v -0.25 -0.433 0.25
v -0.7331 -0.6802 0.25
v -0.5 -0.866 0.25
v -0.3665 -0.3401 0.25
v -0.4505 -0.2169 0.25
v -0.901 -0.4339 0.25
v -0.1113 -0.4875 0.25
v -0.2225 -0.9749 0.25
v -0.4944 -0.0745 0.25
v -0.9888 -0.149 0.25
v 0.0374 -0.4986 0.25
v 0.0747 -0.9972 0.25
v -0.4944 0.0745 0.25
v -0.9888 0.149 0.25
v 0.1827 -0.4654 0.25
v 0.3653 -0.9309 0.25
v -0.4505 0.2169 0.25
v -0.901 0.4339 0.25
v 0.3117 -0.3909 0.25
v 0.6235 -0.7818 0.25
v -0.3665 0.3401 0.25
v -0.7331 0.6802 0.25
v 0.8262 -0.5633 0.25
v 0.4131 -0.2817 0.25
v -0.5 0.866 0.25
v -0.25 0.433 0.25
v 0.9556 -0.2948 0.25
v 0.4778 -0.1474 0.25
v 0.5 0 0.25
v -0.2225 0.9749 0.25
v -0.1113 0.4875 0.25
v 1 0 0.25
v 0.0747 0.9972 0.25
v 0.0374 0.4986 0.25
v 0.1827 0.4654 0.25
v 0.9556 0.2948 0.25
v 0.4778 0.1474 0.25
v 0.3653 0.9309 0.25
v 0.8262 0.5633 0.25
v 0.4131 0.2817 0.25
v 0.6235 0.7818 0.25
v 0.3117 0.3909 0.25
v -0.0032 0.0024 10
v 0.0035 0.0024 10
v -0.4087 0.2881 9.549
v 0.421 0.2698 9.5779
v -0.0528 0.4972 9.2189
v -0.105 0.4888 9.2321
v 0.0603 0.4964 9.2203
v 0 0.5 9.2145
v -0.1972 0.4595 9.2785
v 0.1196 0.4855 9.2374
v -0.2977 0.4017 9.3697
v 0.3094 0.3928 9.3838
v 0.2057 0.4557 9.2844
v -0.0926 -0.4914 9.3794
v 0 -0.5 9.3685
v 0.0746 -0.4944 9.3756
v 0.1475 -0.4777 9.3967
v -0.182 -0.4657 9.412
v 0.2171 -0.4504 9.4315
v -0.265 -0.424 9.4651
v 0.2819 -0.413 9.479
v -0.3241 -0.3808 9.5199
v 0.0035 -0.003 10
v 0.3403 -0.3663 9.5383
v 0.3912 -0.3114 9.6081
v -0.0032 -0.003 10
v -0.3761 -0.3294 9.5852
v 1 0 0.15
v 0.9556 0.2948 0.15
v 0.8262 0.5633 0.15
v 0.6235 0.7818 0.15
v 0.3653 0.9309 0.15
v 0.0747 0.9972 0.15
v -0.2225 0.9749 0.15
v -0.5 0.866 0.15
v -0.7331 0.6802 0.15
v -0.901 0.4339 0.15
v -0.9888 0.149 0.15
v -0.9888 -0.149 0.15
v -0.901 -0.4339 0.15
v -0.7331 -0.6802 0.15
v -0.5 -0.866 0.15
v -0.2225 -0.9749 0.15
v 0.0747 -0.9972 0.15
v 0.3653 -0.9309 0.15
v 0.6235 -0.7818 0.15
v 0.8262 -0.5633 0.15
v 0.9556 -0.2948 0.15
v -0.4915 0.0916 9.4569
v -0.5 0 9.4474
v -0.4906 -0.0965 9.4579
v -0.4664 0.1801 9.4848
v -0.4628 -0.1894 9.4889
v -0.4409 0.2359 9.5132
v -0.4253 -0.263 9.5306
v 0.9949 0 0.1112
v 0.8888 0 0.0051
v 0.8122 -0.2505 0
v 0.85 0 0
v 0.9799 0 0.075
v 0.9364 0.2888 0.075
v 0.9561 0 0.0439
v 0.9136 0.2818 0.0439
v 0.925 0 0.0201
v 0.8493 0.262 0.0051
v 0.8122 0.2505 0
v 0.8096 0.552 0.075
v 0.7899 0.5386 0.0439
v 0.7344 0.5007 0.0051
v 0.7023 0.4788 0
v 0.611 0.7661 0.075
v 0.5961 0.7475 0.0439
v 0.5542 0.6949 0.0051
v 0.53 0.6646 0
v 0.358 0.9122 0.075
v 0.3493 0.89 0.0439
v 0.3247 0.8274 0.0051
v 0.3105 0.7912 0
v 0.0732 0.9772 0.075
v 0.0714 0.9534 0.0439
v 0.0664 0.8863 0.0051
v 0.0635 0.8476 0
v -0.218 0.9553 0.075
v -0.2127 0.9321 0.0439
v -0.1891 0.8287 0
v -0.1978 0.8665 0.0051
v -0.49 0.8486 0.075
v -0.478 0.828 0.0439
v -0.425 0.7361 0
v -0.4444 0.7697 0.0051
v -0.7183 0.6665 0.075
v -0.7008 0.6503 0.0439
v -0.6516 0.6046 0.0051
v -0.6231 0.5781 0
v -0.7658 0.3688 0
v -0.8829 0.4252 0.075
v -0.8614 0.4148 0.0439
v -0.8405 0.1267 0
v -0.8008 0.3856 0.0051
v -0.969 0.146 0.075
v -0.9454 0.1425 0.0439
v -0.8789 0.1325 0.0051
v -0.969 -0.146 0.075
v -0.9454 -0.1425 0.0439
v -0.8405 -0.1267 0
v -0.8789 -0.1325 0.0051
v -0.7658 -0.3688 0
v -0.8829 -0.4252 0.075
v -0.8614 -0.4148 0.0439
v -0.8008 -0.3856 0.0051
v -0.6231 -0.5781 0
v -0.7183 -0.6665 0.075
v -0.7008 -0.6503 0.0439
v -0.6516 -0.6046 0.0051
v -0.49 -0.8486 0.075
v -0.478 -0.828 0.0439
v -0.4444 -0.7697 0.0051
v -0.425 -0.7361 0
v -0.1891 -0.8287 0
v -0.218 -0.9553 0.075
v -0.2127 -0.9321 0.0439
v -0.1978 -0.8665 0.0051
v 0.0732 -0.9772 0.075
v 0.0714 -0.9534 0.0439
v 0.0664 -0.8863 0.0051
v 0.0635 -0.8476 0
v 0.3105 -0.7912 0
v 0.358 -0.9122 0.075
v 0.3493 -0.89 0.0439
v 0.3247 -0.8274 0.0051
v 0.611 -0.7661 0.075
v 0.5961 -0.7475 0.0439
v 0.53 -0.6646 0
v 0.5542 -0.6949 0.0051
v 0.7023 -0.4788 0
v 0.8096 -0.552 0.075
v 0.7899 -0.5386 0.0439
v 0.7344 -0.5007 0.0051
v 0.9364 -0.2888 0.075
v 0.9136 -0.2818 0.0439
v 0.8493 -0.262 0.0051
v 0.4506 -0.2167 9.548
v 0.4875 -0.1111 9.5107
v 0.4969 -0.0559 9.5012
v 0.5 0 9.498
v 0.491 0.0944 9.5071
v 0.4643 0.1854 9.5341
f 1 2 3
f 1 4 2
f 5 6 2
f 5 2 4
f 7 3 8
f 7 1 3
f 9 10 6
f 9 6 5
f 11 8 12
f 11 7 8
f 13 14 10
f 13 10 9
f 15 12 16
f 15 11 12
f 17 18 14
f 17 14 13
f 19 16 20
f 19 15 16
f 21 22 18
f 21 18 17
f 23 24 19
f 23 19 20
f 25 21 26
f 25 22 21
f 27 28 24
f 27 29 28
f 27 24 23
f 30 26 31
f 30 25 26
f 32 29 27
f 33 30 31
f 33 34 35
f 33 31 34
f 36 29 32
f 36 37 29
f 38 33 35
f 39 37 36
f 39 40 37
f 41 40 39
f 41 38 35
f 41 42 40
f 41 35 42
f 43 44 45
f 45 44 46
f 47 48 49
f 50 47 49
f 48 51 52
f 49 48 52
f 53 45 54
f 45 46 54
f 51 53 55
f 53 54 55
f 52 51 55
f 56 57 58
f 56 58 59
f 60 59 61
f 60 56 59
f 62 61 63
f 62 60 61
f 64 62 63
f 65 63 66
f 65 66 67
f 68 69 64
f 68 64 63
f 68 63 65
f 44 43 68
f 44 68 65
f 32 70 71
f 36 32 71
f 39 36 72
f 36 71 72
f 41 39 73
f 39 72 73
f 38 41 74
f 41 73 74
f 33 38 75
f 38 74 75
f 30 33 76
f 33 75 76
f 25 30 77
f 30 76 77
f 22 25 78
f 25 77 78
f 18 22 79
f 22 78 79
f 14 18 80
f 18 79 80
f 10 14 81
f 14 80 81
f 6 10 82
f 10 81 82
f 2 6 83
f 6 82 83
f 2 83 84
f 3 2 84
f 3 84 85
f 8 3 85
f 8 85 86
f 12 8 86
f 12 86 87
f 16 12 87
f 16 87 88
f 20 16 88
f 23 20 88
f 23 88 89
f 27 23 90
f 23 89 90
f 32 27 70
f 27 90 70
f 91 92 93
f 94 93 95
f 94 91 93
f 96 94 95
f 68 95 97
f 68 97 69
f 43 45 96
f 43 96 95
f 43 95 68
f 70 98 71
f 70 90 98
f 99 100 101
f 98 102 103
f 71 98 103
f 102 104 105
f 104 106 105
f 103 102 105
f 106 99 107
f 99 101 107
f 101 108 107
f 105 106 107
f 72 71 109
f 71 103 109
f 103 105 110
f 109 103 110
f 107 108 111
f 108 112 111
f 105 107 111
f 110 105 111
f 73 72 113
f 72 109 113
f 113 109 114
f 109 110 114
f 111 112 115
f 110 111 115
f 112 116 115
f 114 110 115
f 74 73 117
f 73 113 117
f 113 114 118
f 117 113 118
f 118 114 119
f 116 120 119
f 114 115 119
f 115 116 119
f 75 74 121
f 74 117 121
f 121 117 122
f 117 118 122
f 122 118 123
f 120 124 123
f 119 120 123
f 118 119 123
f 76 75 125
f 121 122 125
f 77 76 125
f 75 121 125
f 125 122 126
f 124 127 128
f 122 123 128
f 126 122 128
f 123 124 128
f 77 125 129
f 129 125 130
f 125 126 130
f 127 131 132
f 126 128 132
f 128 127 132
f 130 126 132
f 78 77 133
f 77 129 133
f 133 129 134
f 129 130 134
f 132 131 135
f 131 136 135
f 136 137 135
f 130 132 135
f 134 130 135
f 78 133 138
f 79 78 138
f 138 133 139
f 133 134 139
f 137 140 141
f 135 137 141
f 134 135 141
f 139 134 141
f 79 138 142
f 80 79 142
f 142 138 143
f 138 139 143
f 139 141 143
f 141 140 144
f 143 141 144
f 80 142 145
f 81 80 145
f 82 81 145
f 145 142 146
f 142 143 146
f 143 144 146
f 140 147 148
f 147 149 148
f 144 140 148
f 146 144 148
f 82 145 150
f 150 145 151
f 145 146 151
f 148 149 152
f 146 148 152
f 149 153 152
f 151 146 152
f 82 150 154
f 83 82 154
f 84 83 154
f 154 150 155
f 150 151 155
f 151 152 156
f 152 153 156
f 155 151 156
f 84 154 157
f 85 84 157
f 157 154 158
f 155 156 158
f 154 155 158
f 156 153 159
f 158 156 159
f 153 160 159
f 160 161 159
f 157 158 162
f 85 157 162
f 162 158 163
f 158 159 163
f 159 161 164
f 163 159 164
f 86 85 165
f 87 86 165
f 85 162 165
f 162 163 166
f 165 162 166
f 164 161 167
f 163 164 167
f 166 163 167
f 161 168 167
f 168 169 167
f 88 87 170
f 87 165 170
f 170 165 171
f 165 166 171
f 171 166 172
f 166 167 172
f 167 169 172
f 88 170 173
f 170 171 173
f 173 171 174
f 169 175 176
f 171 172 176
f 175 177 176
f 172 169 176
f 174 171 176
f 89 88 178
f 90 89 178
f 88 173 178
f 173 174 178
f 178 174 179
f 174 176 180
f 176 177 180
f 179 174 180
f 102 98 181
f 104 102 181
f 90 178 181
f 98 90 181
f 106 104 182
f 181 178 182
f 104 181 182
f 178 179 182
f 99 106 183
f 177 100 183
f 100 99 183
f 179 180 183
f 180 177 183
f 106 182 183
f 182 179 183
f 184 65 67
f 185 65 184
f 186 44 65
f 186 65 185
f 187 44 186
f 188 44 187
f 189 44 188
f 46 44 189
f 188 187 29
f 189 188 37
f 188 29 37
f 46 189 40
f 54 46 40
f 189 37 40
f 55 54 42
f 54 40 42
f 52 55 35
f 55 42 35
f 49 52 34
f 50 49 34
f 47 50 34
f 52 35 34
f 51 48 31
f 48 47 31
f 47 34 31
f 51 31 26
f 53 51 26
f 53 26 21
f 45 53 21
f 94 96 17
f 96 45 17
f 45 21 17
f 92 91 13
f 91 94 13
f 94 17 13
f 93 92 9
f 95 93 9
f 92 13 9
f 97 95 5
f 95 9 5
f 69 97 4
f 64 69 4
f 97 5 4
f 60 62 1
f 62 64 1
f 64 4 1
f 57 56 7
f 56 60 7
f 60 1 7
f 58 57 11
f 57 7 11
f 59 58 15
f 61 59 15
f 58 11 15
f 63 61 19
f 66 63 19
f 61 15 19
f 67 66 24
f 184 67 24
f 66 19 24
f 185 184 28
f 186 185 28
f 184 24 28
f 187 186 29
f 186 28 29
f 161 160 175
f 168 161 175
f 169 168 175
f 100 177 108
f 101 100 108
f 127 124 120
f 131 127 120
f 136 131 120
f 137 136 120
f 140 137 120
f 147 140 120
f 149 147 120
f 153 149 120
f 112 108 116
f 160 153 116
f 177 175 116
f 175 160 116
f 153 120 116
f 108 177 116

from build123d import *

# Parameters (mm, degrees)
F0_R          = 0.5
F1_DEPTH      = 10
F0_R_2        = 1
F2_DEPTH      = 0.25
F3_R          = 0.15
F5_DEPTH      = 25
F5_DEPTH_BACK = 25
F7_DEPTH      = 25
F7_DEPTH_BACK = 25


with BuildPart() as f1:
    # F0 (on Top) → F1 (new body)
    with BuildSketch(Plane.XY):
        Circle(F0_R)
    extrude(amount=F1_DEPTH)

    # F0 (on Top) → F2 (join)
    with BuildSketch(Plane.XY):
        Circle(F0_R_2)
        Circle(F0_R, mode=Mode.SUBTRACT)
    extrude(amount=F2_DEPTH)

    # F3
    f3_edges = [f1.edges().sort_by_distance(p)[0] for p in [
        (-1, 0, 0),
    ]]
    fillet(f3_edges, radius=F3_R)

    # F4 (on Right) → F5 (cut, two sides)
    with BuildSketch(Plane.YZ) as f5_sk:
        Polygon((-0.642256, 9.187694), (0, 10.003787), (0.555127, 9.12749), (0.555127, 10.278048), (-0.642256, 10.278048), align=None)
    extrude(amount=F5_DEPTH, mode=Mode.SUBTRACT)
    extrude(f5_sk.sketch, amount=-F5_DEPTH_BACK, mode=Mode.SUBTRACT)

    # F6 (on Front) → F7 (cut, two sides)
    with BuildSketch(Plane.XZ) as f7_sk:
        Polygon((-0.578698, 9.359916), (0, 10.00354), (0.59532, 9.401632), (0.59532, 10.164445), (-0.578698, 10.164445), align=None)
    extrude(amount=F7_DEPTH, mode=Mode.SUBTRACT)
    extrude(f7_sk.sketch, amount=-F7_DEPTH_BACK, mode=Mode.SUBTRACT)


solid = f1.part
